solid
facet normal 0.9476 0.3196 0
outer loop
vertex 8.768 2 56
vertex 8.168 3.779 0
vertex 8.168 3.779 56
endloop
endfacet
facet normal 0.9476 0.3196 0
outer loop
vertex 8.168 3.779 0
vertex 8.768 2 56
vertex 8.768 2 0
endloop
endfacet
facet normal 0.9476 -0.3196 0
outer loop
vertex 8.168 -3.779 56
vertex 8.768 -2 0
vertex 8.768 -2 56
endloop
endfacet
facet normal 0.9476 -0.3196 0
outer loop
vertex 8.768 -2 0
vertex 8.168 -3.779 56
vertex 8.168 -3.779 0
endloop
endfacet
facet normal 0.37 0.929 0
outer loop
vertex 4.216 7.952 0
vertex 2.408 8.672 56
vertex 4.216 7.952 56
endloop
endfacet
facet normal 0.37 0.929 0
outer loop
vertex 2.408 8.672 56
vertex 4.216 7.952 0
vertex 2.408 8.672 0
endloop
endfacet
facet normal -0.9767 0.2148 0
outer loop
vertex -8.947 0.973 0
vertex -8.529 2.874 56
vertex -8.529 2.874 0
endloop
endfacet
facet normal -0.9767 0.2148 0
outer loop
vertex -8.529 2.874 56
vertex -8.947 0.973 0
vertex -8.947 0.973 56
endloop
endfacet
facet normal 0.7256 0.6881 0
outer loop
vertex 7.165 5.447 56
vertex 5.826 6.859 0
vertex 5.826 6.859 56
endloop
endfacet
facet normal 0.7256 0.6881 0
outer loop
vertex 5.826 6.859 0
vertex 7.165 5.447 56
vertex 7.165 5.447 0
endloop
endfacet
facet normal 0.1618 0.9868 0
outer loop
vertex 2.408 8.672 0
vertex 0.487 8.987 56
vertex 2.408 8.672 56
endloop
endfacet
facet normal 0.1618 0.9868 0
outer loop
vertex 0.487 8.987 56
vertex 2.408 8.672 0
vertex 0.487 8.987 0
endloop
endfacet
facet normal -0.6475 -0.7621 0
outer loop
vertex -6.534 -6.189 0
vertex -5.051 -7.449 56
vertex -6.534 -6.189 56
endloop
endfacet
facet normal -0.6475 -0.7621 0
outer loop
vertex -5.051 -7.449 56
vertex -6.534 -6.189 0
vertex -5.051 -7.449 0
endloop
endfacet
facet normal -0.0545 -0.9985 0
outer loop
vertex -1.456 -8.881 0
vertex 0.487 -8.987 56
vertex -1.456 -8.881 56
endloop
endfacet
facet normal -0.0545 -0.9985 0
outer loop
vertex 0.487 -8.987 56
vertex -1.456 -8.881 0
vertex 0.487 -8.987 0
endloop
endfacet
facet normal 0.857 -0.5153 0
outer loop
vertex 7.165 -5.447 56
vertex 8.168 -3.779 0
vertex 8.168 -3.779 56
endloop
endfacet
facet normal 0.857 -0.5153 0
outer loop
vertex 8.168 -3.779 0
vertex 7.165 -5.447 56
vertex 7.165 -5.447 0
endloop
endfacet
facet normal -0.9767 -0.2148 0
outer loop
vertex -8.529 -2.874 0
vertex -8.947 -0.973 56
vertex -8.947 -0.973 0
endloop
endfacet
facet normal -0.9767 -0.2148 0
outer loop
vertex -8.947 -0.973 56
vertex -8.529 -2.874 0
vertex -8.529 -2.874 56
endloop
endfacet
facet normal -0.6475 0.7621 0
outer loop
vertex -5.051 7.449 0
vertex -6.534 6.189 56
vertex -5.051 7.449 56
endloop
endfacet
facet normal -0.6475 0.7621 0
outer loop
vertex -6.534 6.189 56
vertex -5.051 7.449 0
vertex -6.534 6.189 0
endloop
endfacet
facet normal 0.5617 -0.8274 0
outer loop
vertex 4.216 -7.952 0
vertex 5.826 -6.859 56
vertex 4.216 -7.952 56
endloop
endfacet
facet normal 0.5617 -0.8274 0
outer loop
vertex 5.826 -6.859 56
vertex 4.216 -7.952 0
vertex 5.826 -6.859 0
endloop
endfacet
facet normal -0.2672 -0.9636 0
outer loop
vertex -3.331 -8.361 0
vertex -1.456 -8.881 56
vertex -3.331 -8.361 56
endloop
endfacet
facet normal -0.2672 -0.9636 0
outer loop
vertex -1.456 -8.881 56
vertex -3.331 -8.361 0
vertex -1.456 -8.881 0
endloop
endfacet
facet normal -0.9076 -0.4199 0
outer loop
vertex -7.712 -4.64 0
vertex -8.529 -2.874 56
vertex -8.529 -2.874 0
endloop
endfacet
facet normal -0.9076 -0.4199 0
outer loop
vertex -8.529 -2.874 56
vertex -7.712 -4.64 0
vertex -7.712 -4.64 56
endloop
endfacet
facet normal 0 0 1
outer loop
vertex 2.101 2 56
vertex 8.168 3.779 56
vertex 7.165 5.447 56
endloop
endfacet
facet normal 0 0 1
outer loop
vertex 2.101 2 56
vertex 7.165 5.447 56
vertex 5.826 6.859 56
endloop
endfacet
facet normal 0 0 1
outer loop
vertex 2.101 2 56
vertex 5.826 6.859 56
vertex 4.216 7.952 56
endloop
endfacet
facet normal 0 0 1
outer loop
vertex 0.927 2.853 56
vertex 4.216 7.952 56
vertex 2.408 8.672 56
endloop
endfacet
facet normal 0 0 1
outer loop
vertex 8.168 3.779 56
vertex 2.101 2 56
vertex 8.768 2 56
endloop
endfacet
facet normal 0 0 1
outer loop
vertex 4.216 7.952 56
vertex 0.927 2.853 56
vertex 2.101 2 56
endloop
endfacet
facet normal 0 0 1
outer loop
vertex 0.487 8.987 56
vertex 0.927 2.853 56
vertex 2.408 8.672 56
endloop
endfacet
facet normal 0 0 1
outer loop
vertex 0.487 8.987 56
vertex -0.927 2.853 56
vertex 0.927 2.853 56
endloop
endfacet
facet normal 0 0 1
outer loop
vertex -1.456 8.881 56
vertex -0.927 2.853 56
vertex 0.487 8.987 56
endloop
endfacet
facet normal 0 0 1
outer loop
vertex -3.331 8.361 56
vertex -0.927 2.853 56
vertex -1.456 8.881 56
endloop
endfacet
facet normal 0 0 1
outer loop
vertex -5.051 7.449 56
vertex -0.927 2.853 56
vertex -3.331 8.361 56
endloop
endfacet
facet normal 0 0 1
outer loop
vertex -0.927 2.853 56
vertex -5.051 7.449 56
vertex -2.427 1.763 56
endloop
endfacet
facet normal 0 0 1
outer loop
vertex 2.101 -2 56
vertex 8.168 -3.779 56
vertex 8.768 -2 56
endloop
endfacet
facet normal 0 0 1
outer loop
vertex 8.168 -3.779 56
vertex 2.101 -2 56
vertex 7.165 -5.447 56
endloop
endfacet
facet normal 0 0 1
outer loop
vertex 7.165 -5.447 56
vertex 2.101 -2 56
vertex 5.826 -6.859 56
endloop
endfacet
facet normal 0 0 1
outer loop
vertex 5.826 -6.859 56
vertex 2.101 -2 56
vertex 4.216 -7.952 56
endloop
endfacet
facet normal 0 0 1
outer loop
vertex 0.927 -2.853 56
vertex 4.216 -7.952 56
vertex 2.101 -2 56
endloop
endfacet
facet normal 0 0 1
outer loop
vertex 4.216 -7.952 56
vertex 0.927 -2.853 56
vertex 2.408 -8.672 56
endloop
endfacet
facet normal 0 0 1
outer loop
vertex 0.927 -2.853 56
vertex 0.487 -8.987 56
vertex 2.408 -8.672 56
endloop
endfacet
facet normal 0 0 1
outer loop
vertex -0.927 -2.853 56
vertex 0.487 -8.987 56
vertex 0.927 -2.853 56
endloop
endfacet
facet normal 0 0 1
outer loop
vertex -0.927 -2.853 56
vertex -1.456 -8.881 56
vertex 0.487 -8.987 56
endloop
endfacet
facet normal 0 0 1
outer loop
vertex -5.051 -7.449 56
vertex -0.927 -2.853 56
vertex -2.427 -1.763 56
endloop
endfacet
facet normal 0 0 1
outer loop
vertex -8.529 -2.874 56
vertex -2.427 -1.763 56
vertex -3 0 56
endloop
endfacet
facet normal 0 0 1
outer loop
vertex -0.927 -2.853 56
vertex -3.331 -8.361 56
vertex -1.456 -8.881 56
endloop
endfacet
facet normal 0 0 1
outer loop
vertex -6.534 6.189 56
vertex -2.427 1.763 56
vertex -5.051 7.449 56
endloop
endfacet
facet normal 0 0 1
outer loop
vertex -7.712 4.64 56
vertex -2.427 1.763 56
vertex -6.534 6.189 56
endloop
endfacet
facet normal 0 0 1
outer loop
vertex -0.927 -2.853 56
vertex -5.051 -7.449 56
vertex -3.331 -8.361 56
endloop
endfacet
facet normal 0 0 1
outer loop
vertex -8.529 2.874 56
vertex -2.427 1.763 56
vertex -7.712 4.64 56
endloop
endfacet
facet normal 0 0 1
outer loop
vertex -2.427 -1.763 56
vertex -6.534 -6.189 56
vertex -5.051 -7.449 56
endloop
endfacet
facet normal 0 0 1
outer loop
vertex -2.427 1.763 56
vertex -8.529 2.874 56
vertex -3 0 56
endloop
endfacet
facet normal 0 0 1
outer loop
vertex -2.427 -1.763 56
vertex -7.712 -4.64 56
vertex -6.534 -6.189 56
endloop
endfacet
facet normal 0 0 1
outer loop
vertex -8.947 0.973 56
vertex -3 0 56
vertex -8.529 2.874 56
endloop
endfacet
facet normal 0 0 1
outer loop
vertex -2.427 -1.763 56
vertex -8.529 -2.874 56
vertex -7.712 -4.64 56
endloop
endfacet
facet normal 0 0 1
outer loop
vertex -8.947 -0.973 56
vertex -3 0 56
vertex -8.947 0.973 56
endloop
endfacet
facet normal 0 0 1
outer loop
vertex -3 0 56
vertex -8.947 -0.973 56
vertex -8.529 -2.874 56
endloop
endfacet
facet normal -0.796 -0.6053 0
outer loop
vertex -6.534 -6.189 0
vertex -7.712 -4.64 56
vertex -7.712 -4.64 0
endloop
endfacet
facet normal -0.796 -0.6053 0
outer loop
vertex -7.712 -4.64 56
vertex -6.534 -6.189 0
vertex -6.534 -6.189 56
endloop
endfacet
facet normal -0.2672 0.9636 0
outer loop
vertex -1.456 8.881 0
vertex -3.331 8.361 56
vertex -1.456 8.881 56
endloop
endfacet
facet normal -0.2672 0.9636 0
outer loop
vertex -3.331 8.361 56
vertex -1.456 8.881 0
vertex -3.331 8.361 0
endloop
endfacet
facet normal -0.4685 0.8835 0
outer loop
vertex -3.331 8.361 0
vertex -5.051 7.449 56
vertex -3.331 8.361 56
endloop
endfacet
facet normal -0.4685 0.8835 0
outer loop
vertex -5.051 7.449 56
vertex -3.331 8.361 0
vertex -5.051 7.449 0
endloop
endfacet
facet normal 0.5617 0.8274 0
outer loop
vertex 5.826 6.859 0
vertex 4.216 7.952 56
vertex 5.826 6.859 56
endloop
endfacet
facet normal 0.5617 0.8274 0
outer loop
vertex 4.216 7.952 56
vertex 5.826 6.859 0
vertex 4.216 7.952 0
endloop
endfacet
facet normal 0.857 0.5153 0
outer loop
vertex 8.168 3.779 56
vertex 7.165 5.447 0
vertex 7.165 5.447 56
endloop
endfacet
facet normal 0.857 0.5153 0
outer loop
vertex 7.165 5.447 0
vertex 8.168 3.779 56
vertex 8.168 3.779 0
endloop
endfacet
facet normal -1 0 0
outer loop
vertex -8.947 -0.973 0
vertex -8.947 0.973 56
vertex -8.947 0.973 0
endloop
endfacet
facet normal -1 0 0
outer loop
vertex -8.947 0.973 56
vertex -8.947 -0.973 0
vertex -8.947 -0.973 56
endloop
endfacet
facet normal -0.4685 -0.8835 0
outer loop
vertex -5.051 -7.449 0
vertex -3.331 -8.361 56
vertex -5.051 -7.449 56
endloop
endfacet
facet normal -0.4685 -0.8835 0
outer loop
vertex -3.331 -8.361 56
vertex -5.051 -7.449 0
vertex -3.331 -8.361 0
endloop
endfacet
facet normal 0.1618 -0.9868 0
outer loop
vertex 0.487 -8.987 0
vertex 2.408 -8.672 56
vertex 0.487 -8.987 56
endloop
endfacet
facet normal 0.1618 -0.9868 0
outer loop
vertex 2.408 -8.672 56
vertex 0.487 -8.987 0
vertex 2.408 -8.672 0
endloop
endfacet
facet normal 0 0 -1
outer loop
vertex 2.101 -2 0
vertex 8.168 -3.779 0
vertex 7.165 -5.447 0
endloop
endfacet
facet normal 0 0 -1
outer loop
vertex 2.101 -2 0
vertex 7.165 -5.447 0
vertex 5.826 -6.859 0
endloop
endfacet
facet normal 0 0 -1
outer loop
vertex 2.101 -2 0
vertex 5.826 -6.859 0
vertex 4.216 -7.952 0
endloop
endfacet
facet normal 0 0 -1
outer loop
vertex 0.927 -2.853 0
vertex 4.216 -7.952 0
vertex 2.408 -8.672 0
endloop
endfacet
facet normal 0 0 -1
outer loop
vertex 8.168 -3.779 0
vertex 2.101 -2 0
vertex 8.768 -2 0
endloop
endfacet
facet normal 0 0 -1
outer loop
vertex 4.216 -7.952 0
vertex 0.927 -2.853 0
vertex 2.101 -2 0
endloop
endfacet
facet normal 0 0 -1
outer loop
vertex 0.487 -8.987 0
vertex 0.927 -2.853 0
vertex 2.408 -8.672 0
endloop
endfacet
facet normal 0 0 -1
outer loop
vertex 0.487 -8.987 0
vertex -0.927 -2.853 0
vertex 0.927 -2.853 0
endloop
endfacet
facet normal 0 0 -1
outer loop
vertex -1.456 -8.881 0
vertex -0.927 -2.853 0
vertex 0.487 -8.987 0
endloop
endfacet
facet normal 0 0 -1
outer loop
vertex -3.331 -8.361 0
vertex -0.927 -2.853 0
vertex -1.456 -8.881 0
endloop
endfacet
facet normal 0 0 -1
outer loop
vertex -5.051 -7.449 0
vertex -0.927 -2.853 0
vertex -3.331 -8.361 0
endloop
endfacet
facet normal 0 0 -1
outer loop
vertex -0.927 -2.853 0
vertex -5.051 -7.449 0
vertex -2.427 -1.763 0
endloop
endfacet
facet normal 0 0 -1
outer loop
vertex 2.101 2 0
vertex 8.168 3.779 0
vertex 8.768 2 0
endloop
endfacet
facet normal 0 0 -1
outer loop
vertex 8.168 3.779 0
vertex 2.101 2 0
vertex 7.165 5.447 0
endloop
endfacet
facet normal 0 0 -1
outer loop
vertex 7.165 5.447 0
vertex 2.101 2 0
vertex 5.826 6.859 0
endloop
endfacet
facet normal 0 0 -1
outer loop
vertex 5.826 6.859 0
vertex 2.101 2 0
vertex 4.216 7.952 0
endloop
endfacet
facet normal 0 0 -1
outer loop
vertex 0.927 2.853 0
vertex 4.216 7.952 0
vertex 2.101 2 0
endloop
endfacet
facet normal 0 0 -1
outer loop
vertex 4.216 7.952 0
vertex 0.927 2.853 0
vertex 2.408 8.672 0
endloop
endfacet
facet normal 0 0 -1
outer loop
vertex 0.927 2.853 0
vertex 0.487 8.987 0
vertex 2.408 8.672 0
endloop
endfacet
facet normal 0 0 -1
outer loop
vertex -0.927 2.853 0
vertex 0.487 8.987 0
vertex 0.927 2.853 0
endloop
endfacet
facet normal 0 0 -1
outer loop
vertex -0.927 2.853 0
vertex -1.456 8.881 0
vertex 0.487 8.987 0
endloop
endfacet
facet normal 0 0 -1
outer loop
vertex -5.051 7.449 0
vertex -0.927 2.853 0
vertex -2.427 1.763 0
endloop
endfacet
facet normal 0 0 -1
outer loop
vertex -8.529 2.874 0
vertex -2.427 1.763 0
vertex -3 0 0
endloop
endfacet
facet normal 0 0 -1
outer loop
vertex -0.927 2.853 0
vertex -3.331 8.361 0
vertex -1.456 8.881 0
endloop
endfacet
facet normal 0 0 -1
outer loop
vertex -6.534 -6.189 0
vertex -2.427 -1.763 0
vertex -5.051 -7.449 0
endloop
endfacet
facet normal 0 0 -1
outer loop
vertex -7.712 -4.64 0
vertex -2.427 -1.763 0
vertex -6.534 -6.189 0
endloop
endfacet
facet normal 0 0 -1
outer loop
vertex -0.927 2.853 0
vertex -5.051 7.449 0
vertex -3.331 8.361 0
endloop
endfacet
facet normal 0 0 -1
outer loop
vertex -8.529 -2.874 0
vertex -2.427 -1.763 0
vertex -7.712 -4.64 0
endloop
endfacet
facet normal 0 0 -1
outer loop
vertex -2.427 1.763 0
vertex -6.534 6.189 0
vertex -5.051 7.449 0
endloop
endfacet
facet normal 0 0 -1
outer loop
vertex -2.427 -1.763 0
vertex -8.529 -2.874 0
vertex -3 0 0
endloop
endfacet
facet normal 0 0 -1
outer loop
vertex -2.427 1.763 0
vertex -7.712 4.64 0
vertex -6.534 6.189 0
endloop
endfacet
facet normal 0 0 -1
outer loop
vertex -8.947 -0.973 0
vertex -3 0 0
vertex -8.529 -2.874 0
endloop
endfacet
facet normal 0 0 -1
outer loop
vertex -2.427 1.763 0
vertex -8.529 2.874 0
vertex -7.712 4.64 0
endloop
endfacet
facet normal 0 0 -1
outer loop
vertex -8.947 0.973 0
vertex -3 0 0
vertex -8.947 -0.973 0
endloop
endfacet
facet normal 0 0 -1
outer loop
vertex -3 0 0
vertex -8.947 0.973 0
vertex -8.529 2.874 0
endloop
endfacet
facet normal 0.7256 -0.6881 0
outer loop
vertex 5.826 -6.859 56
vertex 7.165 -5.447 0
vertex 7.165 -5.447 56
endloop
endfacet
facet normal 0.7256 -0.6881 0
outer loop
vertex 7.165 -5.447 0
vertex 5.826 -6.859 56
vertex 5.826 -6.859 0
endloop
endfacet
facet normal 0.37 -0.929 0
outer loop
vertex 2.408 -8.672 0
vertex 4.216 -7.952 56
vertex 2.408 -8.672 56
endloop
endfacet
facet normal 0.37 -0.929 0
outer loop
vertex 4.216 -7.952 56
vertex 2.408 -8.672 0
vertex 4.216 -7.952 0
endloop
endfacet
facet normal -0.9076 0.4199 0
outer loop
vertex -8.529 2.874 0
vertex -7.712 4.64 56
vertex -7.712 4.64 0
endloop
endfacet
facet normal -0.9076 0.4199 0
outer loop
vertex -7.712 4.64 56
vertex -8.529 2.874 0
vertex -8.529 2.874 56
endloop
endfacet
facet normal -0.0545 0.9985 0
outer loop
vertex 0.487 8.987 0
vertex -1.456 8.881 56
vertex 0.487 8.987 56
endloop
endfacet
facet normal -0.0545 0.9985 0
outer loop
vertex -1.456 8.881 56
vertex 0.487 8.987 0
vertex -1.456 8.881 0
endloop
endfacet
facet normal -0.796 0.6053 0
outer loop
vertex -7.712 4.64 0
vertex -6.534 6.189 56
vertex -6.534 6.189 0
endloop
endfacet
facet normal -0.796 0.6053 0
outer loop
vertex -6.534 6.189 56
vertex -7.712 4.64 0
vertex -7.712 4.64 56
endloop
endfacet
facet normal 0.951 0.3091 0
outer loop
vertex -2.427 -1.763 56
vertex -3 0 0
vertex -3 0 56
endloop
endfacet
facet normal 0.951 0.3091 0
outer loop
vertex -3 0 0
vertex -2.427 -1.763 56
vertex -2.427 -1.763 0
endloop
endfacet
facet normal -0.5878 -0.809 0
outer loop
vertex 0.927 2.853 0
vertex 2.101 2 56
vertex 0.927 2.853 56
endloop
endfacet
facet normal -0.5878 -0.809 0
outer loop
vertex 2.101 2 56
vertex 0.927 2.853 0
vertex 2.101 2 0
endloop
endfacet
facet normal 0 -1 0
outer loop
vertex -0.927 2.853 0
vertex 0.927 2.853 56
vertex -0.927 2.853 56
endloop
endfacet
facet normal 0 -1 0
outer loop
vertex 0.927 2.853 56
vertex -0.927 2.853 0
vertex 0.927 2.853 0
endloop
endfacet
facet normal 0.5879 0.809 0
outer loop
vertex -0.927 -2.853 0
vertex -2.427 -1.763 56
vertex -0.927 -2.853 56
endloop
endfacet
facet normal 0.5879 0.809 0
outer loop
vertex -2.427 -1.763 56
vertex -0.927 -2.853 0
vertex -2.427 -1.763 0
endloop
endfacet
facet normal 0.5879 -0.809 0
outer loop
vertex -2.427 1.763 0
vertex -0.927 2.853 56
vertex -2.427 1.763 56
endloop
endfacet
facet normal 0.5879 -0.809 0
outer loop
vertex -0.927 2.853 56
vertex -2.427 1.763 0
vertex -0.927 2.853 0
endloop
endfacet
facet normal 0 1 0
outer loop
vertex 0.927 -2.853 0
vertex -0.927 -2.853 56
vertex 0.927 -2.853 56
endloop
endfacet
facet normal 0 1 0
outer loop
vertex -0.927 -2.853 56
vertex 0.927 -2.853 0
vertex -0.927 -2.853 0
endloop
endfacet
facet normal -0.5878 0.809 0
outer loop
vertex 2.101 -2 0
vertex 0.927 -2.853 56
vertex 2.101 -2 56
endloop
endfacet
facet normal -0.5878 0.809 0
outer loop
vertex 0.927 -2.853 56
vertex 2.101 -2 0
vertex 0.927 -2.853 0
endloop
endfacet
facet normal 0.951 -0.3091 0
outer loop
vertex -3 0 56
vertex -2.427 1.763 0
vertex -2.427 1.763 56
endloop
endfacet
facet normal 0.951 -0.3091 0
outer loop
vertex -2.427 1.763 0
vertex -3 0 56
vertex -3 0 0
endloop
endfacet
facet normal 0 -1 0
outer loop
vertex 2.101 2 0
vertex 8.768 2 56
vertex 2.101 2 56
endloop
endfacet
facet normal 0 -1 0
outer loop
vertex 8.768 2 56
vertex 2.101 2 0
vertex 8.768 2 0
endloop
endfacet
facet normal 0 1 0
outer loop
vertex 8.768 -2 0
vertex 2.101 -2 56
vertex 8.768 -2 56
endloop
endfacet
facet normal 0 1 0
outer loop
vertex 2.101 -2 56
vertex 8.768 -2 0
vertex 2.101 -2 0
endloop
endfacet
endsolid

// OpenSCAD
length = 56;
difference() {
    cylinder(length, 9, 9);
    translate([0, 0, -1])
        cylinder(length+2, 3, 3);
    translate([8, 0, length/2])
        cube([12, 4, length+2], center=true);
}
